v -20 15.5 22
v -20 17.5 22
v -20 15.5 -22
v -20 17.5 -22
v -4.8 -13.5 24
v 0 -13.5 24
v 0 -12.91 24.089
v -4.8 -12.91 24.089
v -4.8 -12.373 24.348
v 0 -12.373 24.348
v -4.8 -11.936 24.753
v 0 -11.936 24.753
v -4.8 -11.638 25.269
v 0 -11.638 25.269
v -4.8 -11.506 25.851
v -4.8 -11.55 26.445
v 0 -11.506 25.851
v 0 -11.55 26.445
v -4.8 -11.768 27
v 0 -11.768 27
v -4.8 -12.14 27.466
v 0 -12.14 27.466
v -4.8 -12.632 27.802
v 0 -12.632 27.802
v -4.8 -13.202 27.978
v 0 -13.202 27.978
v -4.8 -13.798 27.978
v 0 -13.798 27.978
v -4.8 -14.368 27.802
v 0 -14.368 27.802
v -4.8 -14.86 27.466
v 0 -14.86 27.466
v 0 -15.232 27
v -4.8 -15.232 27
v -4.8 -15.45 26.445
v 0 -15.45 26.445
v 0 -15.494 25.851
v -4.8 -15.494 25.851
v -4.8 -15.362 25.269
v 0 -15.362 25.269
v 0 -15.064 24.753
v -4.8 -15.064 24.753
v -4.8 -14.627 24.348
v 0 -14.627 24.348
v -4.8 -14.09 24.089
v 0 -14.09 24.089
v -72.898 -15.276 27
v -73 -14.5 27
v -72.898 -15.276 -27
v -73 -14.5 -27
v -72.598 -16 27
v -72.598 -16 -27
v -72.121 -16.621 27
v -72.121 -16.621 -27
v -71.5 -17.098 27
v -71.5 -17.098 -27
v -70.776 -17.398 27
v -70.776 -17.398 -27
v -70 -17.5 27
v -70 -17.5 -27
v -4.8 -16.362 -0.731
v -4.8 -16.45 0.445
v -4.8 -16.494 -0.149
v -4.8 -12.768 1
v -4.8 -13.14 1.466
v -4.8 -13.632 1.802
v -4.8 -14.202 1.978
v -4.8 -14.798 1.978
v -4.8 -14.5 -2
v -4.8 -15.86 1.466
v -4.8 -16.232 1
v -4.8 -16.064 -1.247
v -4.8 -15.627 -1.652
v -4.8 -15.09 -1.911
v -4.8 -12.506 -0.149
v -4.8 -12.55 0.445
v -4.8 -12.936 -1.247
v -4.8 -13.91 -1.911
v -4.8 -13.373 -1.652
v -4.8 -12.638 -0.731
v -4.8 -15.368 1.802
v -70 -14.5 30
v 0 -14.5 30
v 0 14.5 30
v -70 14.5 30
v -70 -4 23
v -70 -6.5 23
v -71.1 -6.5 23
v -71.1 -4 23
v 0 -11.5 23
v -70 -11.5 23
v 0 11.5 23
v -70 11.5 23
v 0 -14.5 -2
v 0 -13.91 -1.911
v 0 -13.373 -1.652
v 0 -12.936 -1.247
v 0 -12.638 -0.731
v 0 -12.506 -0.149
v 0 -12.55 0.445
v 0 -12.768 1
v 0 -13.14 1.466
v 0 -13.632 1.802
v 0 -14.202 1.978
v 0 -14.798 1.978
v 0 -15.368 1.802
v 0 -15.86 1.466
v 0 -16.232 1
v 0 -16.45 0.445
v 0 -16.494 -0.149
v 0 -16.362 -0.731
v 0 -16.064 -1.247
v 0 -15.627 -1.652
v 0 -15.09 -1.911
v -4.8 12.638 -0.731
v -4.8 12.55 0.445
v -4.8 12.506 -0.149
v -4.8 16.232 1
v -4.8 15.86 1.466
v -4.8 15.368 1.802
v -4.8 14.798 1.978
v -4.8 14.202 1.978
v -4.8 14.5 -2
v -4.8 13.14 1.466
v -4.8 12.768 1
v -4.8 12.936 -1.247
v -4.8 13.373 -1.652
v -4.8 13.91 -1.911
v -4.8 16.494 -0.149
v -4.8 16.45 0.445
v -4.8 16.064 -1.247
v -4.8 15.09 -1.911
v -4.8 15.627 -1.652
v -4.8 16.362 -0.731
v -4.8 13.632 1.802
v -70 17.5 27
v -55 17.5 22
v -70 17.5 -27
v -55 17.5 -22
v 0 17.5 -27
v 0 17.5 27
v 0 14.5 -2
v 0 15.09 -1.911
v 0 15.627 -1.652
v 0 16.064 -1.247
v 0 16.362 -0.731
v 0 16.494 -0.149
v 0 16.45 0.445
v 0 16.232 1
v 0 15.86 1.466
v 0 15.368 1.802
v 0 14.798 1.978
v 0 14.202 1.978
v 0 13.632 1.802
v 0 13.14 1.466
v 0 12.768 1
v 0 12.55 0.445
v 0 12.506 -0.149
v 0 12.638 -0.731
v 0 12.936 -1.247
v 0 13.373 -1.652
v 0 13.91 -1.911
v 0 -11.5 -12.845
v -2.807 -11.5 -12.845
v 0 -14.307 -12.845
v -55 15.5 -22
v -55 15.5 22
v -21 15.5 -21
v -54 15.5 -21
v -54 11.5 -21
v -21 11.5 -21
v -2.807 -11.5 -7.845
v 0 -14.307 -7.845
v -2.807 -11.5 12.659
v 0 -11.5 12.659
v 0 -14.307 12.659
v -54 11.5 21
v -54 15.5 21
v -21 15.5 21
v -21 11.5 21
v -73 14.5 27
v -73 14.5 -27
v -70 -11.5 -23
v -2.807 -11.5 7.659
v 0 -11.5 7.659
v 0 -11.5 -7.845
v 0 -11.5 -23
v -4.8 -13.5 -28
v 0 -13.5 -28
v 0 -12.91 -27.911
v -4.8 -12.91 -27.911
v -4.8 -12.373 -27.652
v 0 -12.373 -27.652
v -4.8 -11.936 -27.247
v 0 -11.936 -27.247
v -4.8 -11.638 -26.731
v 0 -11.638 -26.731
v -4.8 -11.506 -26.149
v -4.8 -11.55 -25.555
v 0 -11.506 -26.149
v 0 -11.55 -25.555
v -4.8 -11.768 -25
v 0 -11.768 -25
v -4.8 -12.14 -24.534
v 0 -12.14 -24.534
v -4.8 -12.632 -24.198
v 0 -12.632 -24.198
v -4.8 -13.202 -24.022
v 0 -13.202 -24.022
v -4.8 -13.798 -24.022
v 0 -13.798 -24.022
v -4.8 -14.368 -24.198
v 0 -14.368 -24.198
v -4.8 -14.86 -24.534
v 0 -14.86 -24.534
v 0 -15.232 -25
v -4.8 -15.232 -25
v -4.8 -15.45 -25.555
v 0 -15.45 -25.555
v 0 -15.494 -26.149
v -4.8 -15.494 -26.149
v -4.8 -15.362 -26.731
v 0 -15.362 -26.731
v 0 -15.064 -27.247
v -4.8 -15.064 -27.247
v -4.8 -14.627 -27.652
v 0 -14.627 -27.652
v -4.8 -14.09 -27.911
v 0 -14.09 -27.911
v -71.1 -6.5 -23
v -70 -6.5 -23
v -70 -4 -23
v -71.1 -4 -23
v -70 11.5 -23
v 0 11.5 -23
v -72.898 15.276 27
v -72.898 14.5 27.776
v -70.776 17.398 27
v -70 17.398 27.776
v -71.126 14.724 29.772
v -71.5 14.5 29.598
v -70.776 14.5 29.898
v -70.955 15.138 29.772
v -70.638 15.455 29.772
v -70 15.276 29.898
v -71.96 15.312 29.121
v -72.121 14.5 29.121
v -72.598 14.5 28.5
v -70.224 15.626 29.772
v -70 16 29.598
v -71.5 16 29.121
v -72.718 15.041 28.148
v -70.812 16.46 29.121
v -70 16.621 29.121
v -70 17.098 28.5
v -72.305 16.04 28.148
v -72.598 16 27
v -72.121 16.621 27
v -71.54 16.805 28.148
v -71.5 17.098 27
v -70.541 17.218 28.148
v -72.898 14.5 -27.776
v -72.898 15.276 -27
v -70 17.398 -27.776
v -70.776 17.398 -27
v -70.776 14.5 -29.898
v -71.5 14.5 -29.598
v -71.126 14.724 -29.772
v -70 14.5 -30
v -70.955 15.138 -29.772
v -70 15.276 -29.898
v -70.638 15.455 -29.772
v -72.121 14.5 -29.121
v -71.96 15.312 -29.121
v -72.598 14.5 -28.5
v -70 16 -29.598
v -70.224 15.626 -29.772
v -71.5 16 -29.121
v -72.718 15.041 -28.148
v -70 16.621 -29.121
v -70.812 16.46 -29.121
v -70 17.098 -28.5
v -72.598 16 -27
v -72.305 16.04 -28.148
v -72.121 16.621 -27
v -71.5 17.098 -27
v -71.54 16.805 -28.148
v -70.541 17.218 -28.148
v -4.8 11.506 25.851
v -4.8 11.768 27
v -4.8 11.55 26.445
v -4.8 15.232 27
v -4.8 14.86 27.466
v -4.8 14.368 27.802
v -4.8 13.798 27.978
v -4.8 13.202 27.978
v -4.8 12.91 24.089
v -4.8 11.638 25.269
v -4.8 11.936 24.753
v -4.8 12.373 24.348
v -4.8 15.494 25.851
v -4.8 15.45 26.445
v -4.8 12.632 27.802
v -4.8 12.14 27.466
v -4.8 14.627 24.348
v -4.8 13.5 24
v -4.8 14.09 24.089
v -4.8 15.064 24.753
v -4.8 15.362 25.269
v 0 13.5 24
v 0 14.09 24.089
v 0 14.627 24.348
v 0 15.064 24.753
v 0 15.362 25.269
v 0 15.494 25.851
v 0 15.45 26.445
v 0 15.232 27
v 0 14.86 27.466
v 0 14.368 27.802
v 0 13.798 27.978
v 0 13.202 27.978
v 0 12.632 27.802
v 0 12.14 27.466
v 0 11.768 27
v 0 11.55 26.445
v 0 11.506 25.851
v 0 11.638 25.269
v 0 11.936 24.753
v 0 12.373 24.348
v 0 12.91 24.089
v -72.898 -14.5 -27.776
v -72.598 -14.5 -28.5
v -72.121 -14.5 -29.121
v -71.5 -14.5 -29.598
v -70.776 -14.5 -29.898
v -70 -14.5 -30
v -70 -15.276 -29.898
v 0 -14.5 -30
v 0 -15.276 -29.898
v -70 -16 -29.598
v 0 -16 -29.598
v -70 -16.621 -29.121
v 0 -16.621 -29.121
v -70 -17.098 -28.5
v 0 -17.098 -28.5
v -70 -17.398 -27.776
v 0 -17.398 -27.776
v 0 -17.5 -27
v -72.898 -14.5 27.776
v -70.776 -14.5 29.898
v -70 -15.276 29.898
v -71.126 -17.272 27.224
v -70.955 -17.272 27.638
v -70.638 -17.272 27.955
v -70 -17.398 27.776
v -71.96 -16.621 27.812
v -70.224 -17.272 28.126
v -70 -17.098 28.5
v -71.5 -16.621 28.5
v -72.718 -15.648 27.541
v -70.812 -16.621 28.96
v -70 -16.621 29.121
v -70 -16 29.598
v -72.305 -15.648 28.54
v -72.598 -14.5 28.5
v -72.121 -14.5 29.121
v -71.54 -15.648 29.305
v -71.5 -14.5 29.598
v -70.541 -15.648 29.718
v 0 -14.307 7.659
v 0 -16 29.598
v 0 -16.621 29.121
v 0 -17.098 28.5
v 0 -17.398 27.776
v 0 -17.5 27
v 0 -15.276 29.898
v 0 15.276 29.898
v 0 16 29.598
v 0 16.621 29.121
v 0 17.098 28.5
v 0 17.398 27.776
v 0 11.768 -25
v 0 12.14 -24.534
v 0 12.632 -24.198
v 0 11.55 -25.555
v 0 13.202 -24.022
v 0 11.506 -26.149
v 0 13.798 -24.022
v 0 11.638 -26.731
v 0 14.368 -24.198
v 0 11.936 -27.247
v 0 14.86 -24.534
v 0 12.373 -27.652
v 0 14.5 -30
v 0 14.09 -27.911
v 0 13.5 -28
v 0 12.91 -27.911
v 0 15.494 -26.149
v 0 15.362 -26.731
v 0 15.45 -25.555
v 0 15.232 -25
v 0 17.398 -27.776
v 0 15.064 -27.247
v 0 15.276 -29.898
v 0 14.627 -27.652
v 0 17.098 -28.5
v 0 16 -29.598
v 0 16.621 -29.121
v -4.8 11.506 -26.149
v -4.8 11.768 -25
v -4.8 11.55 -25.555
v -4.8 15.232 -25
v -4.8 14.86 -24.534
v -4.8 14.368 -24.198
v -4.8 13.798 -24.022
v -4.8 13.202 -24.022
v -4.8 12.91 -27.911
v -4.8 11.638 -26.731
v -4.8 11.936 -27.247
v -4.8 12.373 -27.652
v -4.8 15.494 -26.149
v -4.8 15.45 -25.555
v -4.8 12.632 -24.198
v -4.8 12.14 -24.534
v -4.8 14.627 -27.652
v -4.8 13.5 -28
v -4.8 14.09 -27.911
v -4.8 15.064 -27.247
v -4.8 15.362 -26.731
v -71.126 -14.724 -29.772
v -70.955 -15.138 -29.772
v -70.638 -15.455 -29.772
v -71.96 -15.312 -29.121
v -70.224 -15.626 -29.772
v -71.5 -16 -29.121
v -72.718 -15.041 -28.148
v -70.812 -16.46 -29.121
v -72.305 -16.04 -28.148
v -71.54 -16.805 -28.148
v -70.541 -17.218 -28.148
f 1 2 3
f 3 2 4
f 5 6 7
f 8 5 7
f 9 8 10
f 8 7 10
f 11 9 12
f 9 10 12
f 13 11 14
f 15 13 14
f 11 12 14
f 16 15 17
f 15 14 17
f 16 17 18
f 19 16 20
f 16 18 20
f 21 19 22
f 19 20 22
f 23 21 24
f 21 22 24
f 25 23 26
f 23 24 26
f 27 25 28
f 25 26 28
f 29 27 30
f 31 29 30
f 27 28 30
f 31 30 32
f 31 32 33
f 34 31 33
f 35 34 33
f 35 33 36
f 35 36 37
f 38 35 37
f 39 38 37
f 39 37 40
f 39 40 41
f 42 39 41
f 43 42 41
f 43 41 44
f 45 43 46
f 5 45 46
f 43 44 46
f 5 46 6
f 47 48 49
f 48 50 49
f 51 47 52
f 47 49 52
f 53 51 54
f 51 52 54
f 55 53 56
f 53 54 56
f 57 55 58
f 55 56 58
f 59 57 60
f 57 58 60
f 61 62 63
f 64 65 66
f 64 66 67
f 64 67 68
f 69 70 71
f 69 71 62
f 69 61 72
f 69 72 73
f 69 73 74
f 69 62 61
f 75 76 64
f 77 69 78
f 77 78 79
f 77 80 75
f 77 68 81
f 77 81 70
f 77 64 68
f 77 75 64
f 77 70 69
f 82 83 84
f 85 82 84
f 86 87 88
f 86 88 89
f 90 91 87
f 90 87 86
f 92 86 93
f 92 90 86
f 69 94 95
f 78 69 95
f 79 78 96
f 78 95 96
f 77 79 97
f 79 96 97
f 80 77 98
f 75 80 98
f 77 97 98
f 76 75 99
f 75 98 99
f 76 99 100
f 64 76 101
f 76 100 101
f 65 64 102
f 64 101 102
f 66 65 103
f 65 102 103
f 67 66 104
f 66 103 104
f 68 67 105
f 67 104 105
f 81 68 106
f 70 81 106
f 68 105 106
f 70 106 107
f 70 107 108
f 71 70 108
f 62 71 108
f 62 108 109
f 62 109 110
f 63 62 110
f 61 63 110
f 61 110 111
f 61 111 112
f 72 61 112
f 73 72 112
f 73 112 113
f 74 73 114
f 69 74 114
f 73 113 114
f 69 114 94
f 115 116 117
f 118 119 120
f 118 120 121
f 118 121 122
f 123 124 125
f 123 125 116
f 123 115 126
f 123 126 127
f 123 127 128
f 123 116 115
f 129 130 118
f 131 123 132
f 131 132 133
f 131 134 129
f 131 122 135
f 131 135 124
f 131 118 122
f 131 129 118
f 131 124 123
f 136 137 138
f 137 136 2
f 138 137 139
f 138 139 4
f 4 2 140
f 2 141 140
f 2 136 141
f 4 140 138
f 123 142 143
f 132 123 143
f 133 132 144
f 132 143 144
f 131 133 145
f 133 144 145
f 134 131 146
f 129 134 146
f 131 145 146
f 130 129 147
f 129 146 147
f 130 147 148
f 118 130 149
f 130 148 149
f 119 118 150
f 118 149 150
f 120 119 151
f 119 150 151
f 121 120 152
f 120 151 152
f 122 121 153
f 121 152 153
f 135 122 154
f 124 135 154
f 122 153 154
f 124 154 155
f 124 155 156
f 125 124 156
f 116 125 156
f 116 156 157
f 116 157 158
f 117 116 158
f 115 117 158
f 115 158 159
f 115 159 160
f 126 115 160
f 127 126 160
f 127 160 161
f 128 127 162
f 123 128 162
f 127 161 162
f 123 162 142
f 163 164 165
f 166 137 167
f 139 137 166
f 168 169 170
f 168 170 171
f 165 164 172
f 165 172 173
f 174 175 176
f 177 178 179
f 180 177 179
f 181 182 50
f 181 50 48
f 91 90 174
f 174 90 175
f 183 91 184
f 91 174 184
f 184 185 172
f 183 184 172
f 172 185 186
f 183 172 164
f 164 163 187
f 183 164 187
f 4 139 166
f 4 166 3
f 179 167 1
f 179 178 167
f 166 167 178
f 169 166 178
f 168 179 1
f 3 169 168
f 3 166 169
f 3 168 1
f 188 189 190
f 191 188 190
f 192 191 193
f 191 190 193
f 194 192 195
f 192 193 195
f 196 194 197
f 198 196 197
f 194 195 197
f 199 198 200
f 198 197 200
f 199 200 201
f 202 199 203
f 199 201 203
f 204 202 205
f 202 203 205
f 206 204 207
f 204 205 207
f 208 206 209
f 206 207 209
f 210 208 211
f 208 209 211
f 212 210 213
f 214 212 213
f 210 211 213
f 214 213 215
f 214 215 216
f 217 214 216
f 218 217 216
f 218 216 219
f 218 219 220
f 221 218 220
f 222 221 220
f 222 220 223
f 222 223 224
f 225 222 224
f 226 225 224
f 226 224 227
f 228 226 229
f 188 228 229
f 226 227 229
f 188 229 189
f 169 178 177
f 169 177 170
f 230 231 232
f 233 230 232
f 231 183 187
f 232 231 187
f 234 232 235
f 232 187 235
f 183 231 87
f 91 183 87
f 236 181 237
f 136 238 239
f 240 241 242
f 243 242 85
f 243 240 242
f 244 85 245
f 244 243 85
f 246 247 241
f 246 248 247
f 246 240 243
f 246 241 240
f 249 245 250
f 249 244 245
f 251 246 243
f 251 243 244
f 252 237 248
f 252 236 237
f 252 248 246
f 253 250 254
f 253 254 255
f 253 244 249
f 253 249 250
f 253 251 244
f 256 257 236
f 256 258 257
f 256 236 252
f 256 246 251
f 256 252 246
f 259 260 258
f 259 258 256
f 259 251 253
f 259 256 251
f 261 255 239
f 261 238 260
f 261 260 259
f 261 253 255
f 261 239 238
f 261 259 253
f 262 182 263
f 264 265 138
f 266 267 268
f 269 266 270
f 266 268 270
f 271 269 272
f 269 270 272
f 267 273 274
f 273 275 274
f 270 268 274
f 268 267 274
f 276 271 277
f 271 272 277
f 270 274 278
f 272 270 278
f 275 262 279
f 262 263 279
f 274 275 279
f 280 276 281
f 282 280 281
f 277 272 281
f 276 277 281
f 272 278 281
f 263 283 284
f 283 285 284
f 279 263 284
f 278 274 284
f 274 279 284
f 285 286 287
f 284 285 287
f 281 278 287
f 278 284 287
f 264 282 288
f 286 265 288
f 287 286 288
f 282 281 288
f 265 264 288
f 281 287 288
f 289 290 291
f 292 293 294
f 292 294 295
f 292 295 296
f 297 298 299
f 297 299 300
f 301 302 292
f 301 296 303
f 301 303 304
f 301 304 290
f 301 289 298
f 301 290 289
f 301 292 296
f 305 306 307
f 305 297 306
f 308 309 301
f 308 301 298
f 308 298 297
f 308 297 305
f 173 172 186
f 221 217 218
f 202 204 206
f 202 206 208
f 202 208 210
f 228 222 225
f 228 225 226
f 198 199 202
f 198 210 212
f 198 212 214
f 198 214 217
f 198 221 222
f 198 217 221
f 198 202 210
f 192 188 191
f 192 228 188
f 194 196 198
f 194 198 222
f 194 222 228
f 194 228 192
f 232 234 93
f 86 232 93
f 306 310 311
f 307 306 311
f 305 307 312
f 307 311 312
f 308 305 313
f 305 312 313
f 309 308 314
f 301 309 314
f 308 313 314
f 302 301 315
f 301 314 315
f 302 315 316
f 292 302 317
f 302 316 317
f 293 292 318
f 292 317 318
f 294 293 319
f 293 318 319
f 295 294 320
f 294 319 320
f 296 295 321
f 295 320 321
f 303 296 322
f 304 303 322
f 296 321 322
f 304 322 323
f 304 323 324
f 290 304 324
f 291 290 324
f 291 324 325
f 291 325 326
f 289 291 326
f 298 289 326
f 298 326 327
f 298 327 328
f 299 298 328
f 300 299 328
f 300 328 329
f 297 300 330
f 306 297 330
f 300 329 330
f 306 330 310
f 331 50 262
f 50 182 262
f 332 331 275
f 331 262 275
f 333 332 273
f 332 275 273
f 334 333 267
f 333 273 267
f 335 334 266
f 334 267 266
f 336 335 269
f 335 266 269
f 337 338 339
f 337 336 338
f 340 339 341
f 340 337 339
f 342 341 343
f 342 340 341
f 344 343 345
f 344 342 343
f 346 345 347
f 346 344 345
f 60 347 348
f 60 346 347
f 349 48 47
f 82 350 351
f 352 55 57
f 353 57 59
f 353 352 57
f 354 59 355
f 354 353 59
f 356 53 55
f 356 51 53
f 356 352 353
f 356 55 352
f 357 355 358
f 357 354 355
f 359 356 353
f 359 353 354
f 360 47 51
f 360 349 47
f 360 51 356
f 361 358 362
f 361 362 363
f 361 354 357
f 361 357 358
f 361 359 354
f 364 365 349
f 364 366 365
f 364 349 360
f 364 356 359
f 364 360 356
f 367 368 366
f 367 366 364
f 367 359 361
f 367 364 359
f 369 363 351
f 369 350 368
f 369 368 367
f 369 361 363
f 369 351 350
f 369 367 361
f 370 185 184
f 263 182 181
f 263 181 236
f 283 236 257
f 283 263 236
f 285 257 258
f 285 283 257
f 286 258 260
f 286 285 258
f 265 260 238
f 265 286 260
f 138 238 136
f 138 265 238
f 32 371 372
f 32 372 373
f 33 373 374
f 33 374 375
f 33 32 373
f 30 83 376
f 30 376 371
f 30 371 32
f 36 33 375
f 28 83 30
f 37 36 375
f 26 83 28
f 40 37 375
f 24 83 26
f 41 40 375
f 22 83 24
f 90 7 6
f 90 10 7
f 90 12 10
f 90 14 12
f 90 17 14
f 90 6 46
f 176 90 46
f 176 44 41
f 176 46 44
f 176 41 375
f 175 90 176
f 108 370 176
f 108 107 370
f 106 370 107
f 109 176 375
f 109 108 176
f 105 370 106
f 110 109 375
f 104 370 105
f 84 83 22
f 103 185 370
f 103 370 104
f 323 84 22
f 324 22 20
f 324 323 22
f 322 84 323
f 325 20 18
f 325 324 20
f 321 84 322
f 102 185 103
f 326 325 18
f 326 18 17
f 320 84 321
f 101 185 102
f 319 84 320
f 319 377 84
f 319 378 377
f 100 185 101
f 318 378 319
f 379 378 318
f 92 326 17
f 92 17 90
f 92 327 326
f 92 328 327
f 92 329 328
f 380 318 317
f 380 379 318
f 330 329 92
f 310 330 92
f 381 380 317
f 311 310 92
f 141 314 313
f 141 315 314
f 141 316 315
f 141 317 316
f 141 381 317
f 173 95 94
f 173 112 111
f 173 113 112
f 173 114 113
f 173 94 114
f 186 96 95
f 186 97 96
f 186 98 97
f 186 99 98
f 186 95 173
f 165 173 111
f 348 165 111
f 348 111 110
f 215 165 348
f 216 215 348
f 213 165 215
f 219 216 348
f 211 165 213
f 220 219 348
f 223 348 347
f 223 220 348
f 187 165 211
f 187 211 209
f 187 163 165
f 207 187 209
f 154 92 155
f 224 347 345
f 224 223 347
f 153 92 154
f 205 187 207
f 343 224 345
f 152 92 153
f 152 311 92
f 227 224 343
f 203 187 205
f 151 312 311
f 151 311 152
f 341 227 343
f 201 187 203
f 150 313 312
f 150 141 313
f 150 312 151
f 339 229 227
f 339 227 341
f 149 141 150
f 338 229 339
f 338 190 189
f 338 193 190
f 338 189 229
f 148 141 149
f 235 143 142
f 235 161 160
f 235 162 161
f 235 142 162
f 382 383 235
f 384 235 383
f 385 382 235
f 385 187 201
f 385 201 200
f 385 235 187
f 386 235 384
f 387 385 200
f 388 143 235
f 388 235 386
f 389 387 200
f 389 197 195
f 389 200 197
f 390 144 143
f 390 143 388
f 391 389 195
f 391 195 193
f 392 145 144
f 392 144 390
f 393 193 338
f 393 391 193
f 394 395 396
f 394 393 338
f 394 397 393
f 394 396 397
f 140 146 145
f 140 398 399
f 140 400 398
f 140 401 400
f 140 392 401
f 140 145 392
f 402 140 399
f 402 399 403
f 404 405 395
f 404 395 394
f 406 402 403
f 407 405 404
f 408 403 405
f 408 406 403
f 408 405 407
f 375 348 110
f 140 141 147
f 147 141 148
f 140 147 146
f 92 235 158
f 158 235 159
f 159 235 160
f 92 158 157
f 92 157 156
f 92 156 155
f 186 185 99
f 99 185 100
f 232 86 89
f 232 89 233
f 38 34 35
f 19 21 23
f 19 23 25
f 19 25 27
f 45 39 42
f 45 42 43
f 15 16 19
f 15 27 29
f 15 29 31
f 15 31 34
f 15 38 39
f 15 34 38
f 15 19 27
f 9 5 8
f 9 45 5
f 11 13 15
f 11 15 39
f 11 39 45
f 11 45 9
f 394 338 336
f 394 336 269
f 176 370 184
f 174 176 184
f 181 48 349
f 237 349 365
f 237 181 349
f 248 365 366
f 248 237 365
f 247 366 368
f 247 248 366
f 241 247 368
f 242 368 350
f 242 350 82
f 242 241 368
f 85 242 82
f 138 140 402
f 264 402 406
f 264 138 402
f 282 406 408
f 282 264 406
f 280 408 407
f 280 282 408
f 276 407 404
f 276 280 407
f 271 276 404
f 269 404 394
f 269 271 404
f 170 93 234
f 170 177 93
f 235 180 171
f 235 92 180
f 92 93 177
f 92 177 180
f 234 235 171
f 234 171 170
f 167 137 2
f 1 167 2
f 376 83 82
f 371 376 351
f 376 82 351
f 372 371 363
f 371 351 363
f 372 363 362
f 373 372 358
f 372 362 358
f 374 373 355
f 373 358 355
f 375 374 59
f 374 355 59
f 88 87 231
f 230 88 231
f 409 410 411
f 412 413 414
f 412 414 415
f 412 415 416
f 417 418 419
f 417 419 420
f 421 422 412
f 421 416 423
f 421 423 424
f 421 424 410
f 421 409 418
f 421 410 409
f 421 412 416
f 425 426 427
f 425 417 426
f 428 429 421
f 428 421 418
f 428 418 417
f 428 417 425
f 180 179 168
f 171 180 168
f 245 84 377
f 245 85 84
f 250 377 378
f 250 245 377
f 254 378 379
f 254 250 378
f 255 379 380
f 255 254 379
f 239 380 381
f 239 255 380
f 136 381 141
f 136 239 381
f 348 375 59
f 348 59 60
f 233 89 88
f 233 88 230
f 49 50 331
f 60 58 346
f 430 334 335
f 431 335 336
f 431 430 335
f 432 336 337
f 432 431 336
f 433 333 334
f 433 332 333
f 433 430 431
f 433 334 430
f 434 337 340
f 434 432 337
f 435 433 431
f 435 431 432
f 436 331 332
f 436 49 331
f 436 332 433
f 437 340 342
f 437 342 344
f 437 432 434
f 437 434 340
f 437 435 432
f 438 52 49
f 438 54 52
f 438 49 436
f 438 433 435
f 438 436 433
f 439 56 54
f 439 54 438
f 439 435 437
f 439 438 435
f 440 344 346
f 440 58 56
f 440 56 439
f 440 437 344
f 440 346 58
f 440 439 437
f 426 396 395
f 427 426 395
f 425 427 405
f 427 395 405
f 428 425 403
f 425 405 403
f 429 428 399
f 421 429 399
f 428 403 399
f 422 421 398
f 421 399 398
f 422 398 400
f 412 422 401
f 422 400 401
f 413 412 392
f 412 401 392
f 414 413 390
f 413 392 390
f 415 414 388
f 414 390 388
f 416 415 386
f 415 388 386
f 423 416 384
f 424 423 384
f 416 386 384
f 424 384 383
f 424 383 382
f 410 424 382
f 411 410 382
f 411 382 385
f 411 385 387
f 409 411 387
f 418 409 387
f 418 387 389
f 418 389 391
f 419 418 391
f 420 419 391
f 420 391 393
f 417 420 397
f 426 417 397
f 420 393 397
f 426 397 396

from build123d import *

# Parameters (mm, degrees)
SKETCH1_W               = 60
SKETCH1_H               = 35
SKETCH1_W_2             = 46
SKETCH1_H_2             = 23
BOSS_EXTRUDE1_DEPTH     = 73
SKETCH2_W               = 46
SKETCH2_H               = 23
BOSS_EXTRUDE2_DEPTH     = 3
SKETCH1_3_R             = 2
CUT_EXTRUDE1_DEPTH      = 4.8
FILLET1_R               = 3
SKETCH3_W               = 46
SKETCH3_H               = 2.5
CUT_EXTRUDE2_DEPTH      = 1.1
SKETCH5_W               = 33
SKETCH5_H               = 42
CUT_EXTRUDE5_DEPTH      = 10
SKETCH5_3_W             = 35
SKETCH5_3_H             = 44
SKETCH5_3_W_2           = 33
SKETCH5_3_H_2           = 42
CUT_EXTRUDE6_DEPTH      = 2
CUT_EXTRUDE8_DEPTH      = 0.5
CUT_EXTRUDE8_DEPTH_BACK = 4.5
CUT_EXTRUDE9_DEPTH      = 0.5
CUT_EXTRUDE9_DEPTH_BACK = 4.5


with BuildPart() as part:
    # Sketch1 → Boss-Extrude1 (new body)
    with BuildSketch(Plane(origin=(0, 0, 0), x_dir=(0, 0, -1), z_dir=(1, 0, 0))):
        Rectangle(SKETCH1_W, SKETCH1_H)
        Rectangle(SKETCH1_W_2, SKETCH1_H_2, mode=Mode.SUBTRACT)
    extrude(amount=-BOSS_EXTRUDE1_DEPTH)

    # Sketch2 → Boss-Extrude2 (add)
    with BuildSketch(Plane.ZY.offset(73)):
        Rectangle(SKETCH2_W, SKETCH2_H)
    extrude(amount=-BOSS_EXTRUDE2_DEPTH)

    # Sketch1<3> → Cut-Extrude1 (cut)
    with BuildSketch(Plane(origin=(0, 0, 0), x_dir=(0, 0, -1), z_dir=(1, 0, 0))):
        with Locations((-26, 13.5)):
            Circle(SKETCH1_3_R)
        with Locations((0, 14.5)):
            Circle(SKETCH1_3_R)
        with Locations((26, 13.5)):
            Circle(SKETCH1_3_R)
        with Locations((0, -14.5)):
            Circle(SKETCH1_3_R)
        with Locations((-26, -13.5)):
            Circle(SKETCH1_3_R)
        with Locations((26, -13.5)):
            Circle(SKETCH1_3_R)
    extrude(amount=-CUT_EXTRUDE1_DEPTH, mode=Mode.SUBTRACT)

    # Fillet1
    fillet1_edges = [part.edges().sort_by_distance(p)[0] for p in [
        (-73, 17.5, 0),
        (-73, 0, 30),
        (-73, -17.5, 0),
        (-73, 0, -30),
        (-36.5, -17.5, 30),
        (-36.5, 17.5, 30),
        (-36.5, 17.5, -30),
        (-36.5, -17.5, -30),
    ]]
    fillet(fillet1_edges, radius=FILLET1_R)

    # Sketch3 → Cut-Extrude2 (cut)
    with BuildSketch(Plane(origin=(-70, 0, 0), x_dir=(0, 0, -1), z_dir=(1, 0, 0))):
        with Locations((0, -5.25)):
            Rectangle(SKETCH3_W, SKETCH3_H)
    extrude(amount=-CUT_EXTRUDE2_DEPTH, mode=Mode.SUBTRACT)

    # Sketch5 → Cut-Extrude5 (cut)
    with BuildSketch(Plane(origin=(0, 17.5, 0), x_dir=(1, 0, 0), z_dir=(0, 1, 0))):
        with Locations((-37.5, 0)):
            Rectangle(SKETCH5_W, SKETCH5_H)
    extrude(amount=-CUT_EXTRUDE5_DEPTH, mode=Mode.SUBTRACT)

    # Sketch5<3> → Cut-Extrude6 (cut)
    with BuildSketch(Plane(origin=(0, 17.5, 0), x_dir=(1, 0, 0), z_dir=(0, 1, 0))):
        with Locations((-37.5, 0)):
            Rectangle(SKETCH5_3_W, SKETCH5_3_H)
        with Locations((-37.5, 0)):
            Rectangle(SKETCH5_3_W_2, SKETCH5_3_H_2, mode=Mode.SUBTRACT)
    extrude(amount=-CUT_EXTRUDE6_DEPTH, mode=Mode.SUBTRACT)

    # Sketch7 → Cut-Extrude8 (cut, two sides)
    with BuildSketch(Plane.XY.offset(12.159)) as cut_extrude8_sk:
        Polygon((0, -11), (0, -14.307106781), (-3.307106781, -11), align=None)
    extrude(amount=CUT_EXTRUDE8_DEPTH, mode=Mode.SUBTRACT)
    extrude(cut_extrude8_sk.sketch, amount=-CUT_EXTRUDE8_DEPTH_BACK, mode=Mode.SUBTRACT)

    # Sketch8 → Cut-Extrude9 (cut, two sides)
    with BuildSketch(Plane(origin=(0, 0, -12.345376068), x_dir=(-1, 0, 0), z_dir=(0, 0, -1))) as cut_extrude9_sk:
        Polygon((0, -11), (3.307106781, -11), (0, -14.307106781), align=None)
    extrude(amount=CUT_EXTRUDE9_DEPTH, mode=Mode.SUBTRACT)
    extrude(cut_extrude9_sk.sketch, amount=-CUT_EXTRUDE9_DEPTH_BACK, mode=Mode.SUBTRACT)


solid = part.part
